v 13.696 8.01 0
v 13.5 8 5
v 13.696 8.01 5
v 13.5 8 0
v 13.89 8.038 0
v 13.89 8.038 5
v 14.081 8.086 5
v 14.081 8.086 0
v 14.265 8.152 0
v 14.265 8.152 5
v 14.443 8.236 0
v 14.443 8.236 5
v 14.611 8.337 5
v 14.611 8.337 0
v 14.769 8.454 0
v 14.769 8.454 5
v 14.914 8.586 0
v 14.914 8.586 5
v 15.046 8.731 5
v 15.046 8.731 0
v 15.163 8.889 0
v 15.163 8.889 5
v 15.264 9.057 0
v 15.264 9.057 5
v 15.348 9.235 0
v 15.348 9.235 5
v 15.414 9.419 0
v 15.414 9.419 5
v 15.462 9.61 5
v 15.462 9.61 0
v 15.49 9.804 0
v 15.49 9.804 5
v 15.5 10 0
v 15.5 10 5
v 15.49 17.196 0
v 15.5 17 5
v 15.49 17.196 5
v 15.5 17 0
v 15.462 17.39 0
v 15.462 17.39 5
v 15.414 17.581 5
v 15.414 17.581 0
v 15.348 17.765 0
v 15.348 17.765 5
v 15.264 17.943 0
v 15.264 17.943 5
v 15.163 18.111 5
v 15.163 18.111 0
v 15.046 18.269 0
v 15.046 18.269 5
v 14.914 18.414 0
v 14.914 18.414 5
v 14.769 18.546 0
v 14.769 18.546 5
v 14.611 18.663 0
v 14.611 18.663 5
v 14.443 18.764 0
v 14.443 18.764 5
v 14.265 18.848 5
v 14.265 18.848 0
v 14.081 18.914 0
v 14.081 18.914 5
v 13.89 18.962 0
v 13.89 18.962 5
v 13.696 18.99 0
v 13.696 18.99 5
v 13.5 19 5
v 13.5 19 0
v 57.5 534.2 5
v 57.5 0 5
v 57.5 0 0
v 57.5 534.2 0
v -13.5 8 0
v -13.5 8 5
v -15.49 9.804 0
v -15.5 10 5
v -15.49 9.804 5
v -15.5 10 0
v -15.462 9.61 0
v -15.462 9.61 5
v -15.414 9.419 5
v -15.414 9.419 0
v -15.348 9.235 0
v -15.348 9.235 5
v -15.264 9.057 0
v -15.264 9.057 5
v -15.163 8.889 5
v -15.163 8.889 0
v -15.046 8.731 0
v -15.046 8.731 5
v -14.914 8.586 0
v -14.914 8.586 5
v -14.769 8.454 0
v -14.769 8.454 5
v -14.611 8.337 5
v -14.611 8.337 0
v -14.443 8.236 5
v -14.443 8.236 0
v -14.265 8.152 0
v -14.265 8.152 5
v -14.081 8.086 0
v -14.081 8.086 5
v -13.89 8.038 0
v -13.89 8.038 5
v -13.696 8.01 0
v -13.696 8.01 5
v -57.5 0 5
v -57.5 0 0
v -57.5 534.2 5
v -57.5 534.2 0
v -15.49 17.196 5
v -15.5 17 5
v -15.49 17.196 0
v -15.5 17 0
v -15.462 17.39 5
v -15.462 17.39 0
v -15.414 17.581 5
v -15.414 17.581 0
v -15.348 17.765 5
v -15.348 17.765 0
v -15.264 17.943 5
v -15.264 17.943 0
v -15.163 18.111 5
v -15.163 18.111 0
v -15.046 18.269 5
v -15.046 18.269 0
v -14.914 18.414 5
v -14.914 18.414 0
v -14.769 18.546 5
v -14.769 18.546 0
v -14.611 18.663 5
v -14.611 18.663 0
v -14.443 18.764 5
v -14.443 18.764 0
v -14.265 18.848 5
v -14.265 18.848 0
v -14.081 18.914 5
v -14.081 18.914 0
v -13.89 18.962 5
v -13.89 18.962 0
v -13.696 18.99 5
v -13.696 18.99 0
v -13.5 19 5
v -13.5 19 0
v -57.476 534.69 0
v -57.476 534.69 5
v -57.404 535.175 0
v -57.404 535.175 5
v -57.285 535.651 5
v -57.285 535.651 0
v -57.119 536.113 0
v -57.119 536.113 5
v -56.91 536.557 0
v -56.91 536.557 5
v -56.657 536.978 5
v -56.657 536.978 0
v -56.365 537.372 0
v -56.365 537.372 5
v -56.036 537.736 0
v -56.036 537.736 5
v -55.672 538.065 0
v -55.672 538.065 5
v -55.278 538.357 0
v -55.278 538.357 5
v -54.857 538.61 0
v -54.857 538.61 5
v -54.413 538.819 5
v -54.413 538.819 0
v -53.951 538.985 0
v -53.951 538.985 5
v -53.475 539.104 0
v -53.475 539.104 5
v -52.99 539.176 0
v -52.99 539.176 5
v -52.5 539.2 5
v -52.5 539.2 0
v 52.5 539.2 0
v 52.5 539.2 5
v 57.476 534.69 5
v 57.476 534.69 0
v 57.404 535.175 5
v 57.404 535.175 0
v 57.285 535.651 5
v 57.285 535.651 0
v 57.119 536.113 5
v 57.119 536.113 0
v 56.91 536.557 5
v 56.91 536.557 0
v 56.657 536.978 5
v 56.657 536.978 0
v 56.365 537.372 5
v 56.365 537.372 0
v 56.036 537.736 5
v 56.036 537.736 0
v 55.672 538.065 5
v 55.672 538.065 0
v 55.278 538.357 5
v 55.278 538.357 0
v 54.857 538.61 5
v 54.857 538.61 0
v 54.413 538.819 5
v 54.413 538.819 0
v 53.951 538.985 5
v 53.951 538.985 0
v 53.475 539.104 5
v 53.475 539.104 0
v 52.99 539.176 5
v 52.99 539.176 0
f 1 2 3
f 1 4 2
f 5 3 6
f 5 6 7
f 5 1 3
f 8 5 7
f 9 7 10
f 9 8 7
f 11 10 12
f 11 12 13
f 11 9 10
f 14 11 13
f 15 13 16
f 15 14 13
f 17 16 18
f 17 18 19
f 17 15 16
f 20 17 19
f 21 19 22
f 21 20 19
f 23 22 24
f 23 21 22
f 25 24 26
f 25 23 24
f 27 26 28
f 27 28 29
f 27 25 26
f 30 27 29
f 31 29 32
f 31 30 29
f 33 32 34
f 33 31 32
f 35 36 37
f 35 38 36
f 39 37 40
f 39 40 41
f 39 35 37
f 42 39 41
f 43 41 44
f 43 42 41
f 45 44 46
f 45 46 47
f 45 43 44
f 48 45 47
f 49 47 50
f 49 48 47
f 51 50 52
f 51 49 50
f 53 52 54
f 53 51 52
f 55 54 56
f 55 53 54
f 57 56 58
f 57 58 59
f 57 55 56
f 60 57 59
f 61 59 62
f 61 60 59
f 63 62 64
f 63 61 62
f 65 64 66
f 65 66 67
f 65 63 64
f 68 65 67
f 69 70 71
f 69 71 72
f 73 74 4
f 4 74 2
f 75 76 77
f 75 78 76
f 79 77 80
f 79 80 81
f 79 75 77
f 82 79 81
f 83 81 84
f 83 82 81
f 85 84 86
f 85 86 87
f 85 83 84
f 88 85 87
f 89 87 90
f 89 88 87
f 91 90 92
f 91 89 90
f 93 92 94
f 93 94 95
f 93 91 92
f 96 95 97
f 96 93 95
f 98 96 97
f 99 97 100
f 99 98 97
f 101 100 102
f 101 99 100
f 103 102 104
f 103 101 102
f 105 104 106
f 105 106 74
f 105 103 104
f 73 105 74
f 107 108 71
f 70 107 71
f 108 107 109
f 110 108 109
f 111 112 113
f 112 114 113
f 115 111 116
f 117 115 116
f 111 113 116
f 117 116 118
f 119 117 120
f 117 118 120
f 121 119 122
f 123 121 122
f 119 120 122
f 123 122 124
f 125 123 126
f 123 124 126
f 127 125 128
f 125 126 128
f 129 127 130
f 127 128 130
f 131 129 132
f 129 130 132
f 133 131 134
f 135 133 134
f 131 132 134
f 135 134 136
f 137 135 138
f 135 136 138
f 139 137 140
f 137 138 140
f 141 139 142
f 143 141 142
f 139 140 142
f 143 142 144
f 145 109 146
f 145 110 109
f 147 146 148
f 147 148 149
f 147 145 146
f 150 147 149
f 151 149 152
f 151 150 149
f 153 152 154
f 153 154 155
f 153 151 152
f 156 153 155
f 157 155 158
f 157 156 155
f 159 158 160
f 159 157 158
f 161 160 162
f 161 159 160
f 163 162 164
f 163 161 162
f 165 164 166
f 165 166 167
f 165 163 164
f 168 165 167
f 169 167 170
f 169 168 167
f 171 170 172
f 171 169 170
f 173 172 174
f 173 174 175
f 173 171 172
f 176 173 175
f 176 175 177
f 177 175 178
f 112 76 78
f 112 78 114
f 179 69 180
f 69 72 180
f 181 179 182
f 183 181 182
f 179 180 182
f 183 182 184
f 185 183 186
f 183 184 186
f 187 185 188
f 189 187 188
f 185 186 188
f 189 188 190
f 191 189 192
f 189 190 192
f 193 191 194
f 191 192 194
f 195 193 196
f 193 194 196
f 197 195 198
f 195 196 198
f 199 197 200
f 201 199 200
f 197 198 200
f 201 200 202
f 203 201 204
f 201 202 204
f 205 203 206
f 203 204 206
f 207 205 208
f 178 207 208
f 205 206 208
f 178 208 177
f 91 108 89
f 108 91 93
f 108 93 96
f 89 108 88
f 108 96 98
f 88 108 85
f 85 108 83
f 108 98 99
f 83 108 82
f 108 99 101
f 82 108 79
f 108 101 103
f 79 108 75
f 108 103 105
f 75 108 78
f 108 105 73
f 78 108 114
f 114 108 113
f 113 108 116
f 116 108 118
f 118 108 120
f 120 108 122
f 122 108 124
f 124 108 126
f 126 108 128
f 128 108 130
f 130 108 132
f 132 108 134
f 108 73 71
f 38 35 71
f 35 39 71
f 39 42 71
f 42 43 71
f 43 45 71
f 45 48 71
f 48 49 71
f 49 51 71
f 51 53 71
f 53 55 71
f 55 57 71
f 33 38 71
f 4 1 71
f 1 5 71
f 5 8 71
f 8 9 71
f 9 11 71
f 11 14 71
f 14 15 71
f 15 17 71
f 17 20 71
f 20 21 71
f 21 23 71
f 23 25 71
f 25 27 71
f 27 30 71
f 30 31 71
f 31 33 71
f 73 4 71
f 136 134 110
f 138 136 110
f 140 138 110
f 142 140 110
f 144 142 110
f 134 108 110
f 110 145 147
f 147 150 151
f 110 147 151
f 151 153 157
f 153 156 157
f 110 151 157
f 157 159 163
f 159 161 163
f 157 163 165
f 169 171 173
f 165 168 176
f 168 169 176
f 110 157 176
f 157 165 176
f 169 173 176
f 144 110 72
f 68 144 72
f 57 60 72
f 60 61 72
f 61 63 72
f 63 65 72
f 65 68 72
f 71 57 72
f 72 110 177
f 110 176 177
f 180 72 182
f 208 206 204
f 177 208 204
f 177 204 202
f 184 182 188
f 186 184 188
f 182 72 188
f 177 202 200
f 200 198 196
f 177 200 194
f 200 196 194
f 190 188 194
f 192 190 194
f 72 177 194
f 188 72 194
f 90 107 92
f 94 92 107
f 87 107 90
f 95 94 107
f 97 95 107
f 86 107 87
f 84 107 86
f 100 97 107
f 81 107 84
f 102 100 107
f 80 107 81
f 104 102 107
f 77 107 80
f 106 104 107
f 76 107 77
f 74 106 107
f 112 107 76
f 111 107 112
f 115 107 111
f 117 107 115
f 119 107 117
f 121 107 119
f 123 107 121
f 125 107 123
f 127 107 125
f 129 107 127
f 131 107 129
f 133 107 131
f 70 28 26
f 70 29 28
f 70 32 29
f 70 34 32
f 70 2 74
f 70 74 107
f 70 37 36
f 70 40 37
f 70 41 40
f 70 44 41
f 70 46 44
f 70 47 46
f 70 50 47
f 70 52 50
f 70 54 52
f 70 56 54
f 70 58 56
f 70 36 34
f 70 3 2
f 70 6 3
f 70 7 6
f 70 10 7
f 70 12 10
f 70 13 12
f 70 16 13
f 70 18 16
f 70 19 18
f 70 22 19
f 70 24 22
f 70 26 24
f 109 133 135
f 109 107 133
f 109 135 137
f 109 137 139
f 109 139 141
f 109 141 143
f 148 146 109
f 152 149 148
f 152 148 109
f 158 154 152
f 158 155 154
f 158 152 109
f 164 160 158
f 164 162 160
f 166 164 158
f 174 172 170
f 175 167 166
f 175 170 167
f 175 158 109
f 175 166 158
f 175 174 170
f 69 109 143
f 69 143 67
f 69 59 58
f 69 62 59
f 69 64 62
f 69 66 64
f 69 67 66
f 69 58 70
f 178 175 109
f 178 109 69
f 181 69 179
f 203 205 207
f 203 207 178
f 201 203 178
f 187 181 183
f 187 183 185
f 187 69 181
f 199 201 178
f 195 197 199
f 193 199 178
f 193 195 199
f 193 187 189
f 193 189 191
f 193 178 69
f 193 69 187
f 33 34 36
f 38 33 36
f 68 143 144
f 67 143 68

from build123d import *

# Parameters (mm, degrees)
SKETCH1_W           = 115
SKETCH1_H           = 499.2
BOSS_EXTRUDE1_DEPTH = 5
CUT_EXTRUDE1_REACH  = 7
SKETCH2_W           = 31
SKETCH2_H           = 11
FILLET1_R           = 2
SKETCH3_W           = 115
SKETCH3_H           = 40
BOSS_EXTRUDE2_DEPTH = 5
FILLET2_R           = 5


with BuildPart() as part:
    # Sketch1 → Boss-Extrude1 (new body)
    with BuildSketch(Plane.XY):
        with Locations((0, 249.6)):
            Rectangle(SKETCH1_W, SKETCH1_H)
    extrude(amount=BOSS_EXTRUDE1_DEPTH)

    # Sketch2 → Cut-Extrude1 (cut, up to next)
    with BuildSketch(Plane.XY.offset(5), mode=Mode.PRIVATE) as cut_extrude1_sk1:
        with Locations((0, 13.5)):
            Rectangle(SKETCH2_W, SKETCH2_H)
    cut_extrude1_tool1 = extrude(cut_extrude1_sk1.sketch, amount=-CUT_EXTRUDE1_REACH, mode=Mode.PRIVATE) & part.part
    add(cut_extrude1_tool1.solids().sort_by_distance((0, 13.5, 5))[0], mode=Mode.SUBTRACT)

    # Fillet1
    fillet1_edges = [part.edges().sort_by_distance(p)[0] for p in [
        (-15.5, 8, 2.5),
        (-15.5, 19, 2.5),
        (15.5, 19, 2.5),
        (15.5, 8, 2.5),
    ]]
    fillet(fillet1_edges, radius=FILLET1_R)

    # Sketch3 → Boss-Extrude2 (add)
    with BuildSketch(Plane.XY.offset(5)):
        with Locations((0, 519.2)):
            Rectangle(SKETCH3_W, SKETCH3_H)
    extrude(amount=-BOSS_EXTRUDE2_DEPTH)

    # Fillet2
    fillet2_edges = [part.edges().sort_by_distance(p)[0] for p in [
        (-57.5, 539.2, 2.5),
        (57.5, 539.2, 2.5),
    ]]
    fillet(fillet2_edges, radius=FILLET2_R)


solid = part.part
